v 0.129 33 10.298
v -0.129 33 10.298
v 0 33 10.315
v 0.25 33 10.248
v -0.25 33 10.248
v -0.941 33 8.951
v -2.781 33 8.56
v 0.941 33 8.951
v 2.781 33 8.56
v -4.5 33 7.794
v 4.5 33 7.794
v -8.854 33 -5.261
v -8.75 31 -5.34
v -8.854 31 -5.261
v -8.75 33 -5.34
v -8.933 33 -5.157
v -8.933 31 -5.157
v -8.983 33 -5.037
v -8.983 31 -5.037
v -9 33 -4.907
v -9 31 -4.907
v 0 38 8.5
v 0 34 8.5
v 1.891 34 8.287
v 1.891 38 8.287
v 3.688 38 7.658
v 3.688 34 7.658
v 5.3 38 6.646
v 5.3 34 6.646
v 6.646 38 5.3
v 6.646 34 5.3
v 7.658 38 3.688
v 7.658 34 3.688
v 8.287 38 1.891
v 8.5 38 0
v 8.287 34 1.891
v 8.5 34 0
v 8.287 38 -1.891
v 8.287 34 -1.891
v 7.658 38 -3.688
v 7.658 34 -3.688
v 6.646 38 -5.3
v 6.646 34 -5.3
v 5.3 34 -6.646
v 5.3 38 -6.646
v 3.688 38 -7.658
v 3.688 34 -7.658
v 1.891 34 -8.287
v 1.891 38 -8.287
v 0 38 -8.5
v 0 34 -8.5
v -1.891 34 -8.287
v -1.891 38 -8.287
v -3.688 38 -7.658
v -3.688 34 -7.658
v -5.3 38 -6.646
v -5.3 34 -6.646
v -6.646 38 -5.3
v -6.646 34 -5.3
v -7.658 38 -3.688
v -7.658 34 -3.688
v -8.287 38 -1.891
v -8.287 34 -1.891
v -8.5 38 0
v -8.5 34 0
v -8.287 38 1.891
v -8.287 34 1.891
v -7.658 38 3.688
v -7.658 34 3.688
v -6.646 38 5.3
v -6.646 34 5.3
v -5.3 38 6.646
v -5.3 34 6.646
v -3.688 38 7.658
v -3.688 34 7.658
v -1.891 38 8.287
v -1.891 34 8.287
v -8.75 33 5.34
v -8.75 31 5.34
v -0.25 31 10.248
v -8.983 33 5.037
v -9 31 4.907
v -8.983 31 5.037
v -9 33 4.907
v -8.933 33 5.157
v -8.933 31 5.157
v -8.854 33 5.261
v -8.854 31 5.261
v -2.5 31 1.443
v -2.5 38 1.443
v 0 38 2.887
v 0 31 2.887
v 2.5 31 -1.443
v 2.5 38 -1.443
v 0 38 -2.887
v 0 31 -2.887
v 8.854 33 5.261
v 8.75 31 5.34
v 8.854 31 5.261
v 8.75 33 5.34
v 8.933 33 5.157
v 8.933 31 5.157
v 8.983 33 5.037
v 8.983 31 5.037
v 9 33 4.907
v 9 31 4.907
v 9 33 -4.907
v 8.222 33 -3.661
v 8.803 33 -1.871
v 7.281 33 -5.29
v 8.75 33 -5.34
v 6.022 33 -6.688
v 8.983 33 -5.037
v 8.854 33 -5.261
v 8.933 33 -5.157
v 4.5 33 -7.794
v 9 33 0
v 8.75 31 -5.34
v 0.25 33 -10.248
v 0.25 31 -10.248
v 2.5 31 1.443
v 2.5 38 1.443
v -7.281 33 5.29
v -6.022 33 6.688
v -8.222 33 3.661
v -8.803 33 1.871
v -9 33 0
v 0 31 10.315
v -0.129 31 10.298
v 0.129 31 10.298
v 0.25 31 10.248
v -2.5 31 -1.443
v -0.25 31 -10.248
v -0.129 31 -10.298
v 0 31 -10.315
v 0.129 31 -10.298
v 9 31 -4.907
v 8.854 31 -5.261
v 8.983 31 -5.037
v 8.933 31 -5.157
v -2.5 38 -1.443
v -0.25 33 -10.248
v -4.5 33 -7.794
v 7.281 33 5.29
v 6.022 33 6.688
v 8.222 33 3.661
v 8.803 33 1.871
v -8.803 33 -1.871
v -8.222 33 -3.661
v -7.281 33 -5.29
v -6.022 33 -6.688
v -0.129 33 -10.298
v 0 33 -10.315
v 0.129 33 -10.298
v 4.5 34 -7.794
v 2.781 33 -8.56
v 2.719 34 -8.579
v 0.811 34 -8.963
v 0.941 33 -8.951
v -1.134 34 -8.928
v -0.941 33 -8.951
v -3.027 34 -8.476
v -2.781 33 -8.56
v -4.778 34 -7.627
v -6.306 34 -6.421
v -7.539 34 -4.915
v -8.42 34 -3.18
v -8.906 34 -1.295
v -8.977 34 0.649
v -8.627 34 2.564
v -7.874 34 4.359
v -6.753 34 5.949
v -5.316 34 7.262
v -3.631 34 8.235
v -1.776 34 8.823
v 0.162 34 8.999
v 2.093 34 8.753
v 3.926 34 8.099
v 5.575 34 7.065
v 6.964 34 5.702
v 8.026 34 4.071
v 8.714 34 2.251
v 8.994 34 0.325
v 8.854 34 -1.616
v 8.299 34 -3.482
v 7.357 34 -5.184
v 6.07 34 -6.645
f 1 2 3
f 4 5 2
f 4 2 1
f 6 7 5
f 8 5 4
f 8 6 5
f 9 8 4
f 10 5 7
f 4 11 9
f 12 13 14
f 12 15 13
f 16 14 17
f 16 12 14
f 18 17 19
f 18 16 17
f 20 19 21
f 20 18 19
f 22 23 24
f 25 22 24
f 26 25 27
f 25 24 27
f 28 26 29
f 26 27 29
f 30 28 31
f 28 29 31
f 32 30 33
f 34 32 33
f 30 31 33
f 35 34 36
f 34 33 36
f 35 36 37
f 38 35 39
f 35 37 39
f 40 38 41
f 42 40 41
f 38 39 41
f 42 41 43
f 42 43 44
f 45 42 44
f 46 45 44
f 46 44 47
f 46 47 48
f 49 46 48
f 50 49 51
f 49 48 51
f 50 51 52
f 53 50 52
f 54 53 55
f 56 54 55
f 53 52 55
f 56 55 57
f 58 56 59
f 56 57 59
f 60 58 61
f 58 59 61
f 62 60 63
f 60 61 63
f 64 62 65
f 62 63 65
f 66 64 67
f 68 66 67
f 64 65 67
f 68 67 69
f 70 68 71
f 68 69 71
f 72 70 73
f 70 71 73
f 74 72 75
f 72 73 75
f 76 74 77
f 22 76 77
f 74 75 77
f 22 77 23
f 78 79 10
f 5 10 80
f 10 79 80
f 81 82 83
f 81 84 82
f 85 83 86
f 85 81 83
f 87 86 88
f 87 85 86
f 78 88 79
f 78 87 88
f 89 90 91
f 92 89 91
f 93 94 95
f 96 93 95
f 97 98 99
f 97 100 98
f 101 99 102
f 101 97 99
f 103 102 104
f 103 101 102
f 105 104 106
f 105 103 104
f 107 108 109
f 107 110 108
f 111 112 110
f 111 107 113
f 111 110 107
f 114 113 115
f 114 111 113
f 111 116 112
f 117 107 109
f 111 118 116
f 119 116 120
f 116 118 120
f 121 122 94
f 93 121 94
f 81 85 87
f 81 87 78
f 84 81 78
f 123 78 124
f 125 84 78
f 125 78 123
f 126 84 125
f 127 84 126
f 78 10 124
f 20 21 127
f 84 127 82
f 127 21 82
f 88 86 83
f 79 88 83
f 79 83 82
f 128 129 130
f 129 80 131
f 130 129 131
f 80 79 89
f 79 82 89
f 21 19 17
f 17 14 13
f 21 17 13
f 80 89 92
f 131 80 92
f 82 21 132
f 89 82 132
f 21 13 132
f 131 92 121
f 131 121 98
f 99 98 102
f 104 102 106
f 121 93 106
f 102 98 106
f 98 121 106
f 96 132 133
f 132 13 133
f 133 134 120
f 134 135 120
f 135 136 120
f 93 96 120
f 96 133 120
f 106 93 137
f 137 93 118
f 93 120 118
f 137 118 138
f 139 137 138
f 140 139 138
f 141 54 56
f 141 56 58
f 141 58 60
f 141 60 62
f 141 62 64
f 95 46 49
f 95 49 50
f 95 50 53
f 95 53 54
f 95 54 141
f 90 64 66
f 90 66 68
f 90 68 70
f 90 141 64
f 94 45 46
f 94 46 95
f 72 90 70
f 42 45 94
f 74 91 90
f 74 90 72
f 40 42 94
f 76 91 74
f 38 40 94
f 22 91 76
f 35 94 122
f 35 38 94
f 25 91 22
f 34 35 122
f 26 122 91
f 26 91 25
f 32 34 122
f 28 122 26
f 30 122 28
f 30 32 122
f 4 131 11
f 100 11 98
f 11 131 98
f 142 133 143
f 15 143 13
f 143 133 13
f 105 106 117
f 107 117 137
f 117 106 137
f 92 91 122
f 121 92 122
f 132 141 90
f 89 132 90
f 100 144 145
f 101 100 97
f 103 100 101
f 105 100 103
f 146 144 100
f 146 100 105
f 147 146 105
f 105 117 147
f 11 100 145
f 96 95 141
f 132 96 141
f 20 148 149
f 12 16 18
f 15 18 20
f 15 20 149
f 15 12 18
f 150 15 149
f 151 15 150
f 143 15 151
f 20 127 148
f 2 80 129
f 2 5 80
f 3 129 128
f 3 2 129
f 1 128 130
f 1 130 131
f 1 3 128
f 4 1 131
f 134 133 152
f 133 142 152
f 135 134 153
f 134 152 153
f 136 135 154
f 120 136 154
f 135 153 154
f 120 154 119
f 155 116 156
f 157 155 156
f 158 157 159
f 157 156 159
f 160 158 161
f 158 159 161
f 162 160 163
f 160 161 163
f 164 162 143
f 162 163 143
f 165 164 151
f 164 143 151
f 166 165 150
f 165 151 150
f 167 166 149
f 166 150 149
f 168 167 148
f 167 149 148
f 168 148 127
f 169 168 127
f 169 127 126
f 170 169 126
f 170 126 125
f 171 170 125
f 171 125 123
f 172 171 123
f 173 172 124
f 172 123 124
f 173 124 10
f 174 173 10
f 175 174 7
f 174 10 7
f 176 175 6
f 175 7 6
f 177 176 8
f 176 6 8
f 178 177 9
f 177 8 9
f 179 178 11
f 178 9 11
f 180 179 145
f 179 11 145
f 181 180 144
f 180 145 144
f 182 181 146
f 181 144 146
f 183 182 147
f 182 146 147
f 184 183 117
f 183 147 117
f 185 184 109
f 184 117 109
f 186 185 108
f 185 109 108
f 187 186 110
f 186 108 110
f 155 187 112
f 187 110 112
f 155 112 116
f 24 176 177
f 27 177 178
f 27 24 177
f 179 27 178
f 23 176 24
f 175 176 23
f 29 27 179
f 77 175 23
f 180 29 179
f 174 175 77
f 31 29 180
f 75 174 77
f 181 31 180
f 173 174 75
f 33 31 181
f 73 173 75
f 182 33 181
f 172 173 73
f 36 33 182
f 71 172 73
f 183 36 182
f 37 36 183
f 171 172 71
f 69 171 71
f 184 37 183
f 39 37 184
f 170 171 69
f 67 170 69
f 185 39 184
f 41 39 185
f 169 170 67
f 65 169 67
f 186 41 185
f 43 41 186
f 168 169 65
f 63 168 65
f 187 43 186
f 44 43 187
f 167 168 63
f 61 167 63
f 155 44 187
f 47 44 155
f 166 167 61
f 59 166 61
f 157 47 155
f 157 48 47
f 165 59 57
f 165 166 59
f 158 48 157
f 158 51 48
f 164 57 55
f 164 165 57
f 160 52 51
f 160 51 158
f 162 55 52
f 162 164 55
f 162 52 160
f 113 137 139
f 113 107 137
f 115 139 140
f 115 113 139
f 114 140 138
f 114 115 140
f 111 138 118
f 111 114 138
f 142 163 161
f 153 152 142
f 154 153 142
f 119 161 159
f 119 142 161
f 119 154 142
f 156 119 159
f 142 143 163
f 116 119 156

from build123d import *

# Parameters (mm, degrees)
BOSS_EXTRUDE1_DEPTH = 2
FILLET1_R           = 0.5
SKETCH2_R           = 9
BOSS_EXTRUDE2_DEPTH = 1
SKETCH3_R           = 8.5
BOSS_EXTRUDE3_DEPTH = 4
CUT_EXTRUDE1_DEPTH  = 16.375249198


with BuildPart() as part:
    # Sketch1 → Boss-Extrude1 (new body)
    with BuildSketch(Plane(origin=(0, 31, 0), x_dir=(1, 0, 0), z_dir=(0, 1, 0))):
        Polygon((0, 10.392304845), (-9, 5.196152423), (-9, -5.196152423), (0, -10.392304845), (9, -5.196152423), (9, 5.196152423), align=None)
    extrude(amount=BOSS_EXTRUDE1_DEPTH)

    # Fillet1
    fillet1_edges = [part.edges().sort_by_distance(p)[0] for p in [
        (9, 32, -5.196152423),
        (9, 32, 5.196152423),
        (0, 32, 10.392304845),
        (-9, 32, 5.196152423),
        (-9, 32, -5.196152423),
        (0, 32, -10.392304845),
    ]]
    fillet(fillet1_edges, radius=FILLET1_R)

    # Sketch2 → Boss-Extrude2 (add)
    with BuildSketch(Plane(origin=(0, 33, 0), x_dir=(1, 0, 0), z_dir=(0, 1, 0))):
        with Locations(Location((0, 0, 0), (0, 0, 60))):
            Circle(SKETCH2_R)
    extrude(amount=BOSS_EXTRUDE2_DEPTH)

    # Sketch3 → Boss-Extrude3 (add)
    with BuildSketch(Plane(origin=(0, 34, 0), x_dir=(1, 0, 0), z_dir=(0, 1, 0))):
        with Locations(Location((0, 0, 0), (0, 0, 270))):
            Circle(SKETCH3_R)
    extrude(amount=BOSS_EXTRUDE3_DEPTH)

    # Sketch4 → Cut-Extrude1 (cut, through all)
    with BuildSketch(Plane(origin=(0, 38, 0), x_dir=(1, 0, 0), z_dir=(0, 1, 0))):
        Polygon((0, 2.886751346), (-2.5, 1.443375673), (-2.5, -1.443375673), (0, -2.886751346), (2.5, -1.443375673), (2.5, 1.443375673), align=None)
    extrude(amount=-CUT_EXTRUDE1_DEPTH, mode=Mode.SUBTRACT)


solid = part.part
